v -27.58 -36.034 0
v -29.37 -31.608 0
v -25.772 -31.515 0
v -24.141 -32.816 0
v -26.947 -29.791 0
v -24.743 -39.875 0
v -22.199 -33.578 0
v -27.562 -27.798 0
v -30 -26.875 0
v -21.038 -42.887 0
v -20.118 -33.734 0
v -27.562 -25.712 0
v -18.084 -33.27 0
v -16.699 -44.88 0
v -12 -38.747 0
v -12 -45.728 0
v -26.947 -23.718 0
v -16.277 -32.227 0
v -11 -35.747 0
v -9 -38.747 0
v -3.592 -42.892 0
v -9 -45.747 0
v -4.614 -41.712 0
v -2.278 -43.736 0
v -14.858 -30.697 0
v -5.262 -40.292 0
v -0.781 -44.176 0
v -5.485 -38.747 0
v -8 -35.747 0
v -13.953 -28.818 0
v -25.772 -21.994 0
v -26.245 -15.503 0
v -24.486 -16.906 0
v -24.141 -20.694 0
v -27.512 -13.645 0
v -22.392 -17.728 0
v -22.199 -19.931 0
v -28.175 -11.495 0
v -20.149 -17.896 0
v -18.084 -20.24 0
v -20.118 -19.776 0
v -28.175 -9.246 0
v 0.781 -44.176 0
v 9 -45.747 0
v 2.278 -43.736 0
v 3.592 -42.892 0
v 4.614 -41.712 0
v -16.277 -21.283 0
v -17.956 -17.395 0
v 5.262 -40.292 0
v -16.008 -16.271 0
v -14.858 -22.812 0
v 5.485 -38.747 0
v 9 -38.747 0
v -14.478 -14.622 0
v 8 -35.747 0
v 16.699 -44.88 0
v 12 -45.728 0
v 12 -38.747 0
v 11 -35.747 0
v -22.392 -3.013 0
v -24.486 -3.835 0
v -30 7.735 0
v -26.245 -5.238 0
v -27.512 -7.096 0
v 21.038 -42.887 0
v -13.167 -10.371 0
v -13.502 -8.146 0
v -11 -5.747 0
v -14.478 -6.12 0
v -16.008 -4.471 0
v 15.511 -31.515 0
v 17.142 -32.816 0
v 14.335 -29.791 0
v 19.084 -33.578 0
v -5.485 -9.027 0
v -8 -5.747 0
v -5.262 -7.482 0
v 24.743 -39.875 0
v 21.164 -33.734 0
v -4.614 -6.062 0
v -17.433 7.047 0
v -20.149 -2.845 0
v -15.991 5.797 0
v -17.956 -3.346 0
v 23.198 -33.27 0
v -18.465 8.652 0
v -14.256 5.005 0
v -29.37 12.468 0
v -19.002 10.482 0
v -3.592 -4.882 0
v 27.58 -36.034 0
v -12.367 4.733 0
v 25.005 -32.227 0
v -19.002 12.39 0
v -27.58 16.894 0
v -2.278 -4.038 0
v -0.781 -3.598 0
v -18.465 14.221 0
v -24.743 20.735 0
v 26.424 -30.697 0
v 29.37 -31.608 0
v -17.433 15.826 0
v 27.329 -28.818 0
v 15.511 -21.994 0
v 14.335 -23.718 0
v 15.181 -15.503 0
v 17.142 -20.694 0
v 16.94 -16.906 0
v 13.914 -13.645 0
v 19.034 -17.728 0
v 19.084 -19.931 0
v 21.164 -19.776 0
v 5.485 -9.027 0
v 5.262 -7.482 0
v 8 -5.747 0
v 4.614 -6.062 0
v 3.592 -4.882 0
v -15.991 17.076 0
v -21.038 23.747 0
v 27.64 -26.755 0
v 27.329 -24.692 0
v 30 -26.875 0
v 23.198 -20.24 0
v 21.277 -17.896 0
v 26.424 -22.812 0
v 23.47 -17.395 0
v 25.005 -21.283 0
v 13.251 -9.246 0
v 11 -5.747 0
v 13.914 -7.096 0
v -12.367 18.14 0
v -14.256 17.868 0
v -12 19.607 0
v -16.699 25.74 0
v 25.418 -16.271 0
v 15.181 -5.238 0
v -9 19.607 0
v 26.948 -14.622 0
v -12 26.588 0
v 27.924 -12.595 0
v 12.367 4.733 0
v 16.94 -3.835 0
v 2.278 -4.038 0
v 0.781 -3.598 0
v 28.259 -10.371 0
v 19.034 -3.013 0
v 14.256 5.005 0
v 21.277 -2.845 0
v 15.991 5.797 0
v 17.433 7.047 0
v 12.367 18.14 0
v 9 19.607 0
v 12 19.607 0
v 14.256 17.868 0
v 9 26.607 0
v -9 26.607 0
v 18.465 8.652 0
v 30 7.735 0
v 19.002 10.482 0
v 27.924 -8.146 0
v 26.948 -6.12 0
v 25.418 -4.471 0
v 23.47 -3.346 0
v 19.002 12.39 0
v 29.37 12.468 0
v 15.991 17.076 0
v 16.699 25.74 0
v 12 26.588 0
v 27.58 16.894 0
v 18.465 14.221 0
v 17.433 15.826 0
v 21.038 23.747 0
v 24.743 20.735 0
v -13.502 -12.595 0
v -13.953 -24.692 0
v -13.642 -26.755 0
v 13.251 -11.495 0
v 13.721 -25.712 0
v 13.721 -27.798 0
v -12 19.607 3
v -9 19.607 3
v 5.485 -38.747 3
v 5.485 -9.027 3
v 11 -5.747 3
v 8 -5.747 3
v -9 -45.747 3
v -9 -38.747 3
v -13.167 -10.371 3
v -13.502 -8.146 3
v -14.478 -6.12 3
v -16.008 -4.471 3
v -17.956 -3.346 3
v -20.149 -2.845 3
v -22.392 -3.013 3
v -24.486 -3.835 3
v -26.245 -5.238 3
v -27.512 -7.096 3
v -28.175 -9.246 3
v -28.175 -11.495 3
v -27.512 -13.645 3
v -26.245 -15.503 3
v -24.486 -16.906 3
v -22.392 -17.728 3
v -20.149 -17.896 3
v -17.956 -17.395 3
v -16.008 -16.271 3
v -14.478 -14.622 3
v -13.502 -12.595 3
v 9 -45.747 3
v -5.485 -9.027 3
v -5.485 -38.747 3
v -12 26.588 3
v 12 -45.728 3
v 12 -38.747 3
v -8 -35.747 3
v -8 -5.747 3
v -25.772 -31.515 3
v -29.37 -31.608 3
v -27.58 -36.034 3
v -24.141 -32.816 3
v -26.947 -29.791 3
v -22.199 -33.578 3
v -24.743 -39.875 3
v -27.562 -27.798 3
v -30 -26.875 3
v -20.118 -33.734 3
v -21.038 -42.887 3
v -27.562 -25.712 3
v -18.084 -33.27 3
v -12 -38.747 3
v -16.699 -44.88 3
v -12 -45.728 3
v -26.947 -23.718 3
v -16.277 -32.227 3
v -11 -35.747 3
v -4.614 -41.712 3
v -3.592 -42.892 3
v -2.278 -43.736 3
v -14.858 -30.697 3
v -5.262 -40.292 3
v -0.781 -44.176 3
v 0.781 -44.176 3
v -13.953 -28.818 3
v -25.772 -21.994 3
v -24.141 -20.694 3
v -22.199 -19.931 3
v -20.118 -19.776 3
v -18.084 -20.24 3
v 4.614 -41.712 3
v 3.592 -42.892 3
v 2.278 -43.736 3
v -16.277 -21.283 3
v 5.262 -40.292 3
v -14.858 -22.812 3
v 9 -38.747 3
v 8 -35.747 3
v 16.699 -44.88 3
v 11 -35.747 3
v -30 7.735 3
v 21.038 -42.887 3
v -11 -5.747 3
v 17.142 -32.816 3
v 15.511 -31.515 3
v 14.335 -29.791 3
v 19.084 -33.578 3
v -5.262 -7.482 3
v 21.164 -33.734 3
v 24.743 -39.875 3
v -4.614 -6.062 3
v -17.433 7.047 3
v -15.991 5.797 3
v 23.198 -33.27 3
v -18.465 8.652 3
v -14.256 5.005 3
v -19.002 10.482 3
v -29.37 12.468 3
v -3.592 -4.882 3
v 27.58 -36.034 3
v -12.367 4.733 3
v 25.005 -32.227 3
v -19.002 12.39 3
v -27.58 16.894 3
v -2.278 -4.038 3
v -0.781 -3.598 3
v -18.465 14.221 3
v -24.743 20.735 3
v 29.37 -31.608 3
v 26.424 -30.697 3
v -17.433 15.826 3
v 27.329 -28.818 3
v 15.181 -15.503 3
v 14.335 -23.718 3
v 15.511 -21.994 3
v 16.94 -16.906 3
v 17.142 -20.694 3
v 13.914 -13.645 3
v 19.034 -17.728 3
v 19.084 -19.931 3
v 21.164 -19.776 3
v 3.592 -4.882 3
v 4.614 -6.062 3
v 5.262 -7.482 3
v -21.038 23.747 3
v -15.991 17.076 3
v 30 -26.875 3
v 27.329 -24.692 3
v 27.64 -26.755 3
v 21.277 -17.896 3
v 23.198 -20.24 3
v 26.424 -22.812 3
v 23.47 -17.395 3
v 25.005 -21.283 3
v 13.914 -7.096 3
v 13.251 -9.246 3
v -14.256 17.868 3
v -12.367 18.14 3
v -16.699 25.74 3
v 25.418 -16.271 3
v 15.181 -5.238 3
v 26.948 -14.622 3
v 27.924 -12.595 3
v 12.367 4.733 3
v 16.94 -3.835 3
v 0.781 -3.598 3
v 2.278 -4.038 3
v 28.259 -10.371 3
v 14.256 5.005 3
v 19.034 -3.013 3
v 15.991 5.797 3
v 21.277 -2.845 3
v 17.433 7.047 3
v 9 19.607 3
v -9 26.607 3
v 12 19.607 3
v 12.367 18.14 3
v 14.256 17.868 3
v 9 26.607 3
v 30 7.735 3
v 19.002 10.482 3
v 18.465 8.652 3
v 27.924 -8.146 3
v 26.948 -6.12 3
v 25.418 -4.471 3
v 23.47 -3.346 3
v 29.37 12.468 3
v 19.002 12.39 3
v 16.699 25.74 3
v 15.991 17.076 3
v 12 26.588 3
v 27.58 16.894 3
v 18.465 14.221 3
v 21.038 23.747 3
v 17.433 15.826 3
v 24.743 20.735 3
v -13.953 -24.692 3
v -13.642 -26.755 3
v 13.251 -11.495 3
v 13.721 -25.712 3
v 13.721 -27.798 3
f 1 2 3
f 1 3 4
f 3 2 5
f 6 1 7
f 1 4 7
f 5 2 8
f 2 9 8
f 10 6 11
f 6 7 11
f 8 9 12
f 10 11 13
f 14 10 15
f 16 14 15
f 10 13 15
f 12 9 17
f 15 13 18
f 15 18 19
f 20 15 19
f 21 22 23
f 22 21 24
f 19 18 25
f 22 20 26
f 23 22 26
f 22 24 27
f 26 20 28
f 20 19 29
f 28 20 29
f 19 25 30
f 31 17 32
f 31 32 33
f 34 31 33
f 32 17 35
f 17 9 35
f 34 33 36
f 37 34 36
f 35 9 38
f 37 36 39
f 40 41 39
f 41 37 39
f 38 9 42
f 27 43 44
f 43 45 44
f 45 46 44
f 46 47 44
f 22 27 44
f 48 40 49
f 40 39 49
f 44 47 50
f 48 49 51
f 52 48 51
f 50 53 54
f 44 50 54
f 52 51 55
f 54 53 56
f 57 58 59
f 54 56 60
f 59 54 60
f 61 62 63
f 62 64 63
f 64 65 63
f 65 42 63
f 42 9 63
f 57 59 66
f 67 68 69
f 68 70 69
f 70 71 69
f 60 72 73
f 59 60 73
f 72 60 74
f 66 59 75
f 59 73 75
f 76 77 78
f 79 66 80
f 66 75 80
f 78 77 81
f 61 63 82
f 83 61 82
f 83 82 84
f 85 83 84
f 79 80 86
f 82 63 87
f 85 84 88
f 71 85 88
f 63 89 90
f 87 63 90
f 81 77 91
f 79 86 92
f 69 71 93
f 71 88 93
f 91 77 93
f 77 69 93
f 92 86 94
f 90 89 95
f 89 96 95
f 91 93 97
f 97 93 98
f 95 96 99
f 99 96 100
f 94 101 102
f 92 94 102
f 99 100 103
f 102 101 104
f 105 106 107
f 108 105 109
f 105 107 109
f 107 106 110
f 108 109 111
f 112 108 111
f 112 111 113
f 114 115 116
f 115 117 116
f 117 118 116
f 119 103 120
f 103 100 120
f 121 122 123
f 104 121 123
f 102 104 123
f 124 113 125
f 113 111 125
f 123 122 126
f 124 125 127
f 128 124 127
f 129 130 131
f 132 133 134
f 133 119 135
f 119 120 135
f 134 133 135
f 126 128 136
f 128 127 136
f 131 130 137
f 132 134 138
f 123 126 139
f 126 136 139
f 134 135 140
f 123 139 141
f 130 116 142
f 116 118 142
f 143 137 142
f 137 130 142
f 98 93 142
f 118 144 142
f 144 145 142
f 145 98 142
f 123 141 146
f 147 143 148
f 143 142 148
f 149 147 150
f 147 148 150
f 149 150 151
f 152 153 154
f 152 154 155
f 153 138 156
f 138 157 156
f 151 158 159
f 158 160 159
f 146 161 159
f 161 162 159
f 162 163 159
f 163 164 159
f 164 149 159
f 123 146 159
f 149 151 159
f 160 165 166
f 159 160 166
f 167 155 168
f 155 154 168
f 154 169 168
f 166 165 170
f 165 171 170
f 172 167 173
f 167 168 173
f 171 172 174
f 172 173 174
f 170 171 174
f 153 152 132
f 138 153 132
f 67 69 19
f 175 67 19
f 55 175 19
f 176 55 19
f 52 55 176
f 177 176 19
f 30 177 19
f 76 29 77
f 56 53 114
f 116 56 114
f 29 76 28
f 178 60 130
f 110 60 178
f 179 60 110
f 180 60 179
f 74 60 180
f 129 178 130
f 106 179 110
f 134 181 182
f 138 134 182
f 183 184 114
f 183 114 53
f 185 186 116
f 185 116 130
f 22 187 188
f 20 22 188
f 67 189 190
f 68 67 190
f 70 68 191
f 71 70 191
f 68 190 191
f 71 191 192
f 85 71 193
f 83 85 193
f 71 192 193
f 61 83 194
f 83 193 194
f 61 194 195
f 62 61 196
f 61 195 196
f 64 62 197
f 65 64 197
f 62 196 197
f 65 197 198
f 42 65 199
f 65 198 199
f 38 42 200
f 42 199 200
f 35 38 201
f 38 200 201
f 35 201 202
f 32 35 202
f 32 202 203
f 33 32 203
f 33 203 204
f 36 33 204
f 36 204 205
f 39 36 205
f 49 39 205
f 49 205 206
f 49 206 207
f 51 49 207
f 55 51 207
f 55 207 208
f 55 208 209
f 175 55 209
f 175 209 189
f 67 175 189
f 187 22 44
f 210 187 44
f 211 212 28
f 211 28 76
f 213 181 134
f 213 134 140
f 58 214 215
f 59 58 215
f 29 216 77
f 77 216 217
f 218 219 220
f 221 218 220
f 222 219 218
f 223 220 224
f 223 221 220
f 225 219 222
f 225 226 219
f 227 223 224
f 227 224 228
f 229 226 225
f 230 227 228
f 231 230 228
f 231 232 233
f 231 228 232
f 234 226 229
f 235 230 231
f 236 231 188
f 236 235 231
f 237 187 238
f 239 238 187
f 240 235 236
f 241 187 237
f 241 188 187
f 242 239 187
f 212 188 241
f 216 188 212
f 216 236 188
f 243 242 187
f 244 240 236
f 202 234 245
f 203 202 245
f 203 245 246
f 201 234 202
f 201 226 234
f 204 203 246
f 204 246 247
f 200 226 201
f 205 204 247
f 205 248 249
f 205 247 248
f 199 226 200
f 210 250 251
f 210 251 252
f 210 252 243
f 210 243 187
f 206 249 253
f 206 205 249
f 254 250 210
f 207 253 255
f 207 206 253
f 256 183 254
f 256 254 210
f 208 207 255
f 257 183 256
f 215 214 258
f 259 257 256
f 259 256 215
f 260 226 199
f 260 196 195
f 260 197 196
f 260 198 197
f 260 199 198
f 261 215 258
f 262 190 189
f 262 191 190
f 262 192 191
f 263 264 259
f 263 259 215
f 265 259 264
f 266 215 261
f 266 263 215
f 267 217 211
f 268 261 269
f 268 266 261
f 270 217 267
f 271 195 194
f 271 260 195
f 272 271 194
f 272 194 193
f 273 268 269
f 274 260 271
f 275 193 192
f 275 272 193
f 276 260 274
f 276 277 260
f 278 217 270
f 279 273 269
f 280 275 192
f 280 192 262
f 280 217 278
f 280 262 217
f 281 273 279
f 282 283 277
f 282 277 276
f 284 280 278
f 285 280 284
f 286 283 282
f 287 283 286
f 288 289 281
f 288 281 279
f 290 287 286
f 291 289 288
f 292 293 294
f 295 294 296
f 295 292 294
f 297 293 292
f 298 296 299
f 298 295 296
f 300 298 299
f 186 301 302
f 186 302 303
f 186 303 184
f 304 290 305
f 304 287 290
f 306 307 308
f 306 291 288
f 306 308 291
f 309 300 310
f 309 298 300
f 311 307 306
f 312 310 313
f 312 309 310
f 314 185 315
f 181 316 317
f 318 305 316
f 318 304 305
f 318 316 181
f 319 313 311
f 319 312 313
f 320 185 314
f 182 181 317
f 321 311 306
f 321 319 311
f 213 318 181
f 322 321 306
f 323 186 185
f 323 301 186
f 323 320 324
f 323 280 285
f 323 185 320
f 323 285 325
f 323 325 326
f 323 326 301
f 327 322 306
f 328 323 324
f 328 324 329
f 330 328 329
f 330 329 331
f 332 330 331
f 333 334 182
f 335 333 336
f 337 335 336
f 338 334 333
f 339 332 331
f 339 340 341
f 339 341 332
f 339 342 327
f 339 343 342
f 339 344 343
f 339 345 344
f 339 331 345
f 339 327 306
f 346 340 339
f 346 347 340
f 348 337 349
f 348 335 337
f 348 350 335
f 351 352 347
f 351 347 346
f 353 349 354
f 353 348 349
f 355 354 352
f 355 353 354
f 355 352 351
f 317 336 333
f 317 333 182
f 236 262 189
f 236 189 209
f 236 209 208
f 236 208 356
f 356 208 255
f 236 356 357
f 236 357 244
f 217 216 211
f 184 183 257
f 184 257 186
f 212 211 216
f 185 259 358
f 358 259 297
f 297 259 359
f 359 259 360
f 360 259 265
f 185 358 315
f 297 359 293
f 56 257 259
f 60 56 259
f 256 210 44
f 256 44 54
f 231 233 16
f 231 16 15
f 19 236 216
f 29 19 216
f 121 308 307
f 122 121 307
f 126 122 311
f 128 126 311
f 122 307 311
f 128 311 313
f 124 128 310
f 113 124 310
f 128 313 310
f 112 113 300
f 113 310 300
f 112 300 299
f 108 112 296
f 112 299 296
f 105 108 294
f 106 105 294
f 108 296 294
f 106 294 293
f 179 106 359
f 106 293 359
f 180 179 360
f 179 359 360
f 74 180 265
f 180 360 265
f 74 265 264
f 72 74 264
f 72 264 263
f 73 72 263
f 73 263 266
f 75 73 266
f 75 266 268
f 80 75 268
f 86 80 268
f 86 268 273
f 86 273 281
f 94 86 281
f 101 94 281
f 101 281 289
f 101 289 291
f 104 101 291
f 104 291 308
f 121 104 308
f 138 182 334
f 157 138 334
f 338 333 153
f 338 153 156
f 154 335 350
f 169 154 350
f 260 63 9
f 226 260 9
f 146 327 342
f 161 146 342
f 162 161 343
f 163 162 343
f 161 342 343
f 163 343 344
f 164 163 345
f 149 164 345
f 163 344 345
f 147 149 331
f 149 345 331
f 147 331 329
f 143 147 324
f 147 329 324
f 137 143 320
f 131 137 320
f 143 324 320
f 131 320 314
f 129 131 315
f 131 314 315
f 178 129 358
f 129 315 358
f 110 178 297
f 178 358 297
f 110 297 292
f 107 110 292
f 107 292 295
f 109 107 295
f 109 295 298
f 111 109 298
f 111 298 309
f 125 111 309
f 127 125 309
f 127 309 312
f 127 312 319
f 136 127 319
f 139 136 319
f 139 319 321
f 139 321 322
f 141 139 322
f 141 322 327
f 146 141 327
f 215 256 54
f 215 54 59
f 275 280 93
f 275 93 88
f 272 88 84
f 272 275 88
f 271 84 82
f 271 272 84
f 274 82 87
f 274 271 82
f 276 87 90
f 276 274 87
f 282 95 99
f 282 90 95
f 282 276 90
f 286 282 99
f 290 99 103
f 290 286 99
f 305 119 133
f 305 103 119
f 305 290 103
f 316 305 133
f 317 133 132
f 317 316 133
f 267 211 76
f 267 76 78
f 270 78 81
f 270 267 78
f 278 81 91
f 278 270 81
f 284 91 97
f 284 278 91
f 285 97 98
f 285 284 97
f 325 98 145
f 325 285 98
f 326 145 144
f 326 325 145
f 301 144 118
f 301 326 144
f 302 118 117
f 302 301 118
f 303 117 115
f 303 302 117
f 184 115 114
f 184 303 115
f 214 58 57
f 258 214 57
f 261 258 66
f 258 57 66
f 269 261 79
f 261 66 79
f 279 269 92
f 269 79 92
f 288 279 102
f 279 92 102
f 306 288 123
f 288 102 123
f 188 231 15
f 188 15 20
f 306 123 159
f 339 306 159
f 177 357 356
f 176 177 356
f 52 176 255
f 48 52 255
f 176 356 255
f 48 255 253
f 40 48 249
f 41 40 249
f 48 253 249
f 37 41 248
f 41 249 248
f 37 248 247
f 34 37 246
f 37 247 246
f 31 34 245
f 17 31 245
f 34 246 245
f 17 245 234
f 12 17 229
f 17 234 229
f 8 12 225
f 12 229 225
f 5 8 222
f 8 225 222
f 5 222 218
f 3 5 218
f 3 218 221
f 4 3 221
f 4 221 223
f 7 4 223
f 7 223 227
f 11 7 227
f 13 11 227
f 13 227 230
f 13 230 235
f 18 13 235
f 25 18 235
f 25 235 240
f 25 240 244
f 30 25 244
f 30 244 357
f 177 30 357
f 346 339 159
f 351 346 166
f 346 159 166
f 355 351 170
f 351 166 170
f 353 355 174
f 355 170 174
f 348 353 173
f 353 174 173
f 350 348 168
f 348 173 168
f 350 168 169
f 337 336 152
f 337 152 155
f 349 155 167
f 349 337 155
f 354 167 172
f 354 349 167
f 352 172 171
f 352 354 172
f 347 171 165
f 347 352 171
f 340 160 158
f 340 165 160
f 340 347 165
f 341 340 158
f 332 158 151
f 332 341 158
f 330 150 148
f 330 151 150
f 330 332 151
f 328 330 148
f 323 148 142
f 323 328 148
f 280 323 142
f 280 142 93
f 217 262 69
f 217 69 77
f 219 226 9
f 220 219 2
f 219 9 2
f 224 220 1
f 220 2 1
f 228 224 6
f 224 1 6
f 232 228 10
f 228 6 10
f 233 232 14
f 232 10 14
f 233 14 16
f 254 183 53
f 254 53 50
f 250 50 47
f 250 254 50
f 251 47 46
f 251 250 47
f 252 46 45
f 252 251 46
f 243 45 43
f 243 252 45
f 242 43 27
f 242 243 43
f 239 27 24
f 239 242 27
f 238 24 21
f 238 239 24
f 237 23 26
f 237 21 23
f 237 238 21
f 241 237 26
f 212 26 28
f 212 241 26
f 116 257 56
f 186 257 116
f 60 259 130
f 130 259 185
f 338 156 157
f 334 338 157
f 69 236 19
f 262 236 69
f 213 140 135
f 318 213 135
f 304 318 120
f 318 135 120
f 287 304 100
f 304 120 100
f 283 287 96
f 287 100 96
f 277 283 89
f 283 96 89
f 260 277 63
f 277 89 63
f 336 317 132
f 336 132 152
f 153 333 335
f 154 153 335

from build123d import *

# Parameters (mm, degrees)
BOSS_EXTRUDE1_DEPTH     = 3
SKETCH2_R               = 7.546344396
SKETCH2_R_2             = 6.998827146
SKETCH2_W               = 3
SKETCH2_H               = 30
SKETCH2_H_2             = 7
CUT_EXTRUDE1_DEPTH      = 1
CUT_EXTRUDE1_DEPTH_BACK = 4


with BuildPart() as part:
    # Sketch1 → Boss-Extrude1 (new body)
    with BuildSketch(Plane.XY):
        with BuildLine():
            Line((-11.521707287, -45.747254375), (11.521707287, -45.747254375))
            ThreePointArc((11.521707287, -45.747254375), (24.576520143, -40.046827338), (30, -26.874550642))
            Line((30, -26.874550642), (30, 7.734550642))
            ThreePointArc((30, 7.734550642), (24.576520143, 20.906827338), (11.521707287, 26.607254375))
            Line((11.521707287, 26.607254375), (-11.521707287, 26.607254375))
            ThreePointArc((-11.521707287, 26.607254375), (-24.576520143, 20.906827338), (-30, 7.734550642))
            Line((-30, 7.734550642), (-30, -26.874550642))
            ThreePointArc((-30, -26.874550642), (-24.576520143, -40.046827338), (-11.521707287, -45.747254375))
        make_face()
    extrude(amount=BOSS_EXTRUDE1_DEPTH)

    # Sketch2 → Cut-Extrude1 (cut, two sides)
    with BuildSketch(Plane.XY.offset(3)) as cut_extrude1_sk:
        with Locations((-20.712852781, -10.370577489)):
            Circle(SKETCH2_R)
        with Locations((-20.641158555, -26.754776444)):
            Circle(SKETCH2_R_2)
        with Locations((20.641158555, -26.754776444)):
            Circle(SKETCH2_R_2)
        with Locations((20.712852781, -10.370577489)):
            Circle(SKETCH2_R)
        with Locations((-9.5, -20.747254375)):
            Rectangle(SKETCH2_W, SKETCH2_H)
        with Locations((9.5, -20.747254375)):
            Rectangle(SKETCH2_W, SKETCH2_H)
        with BuildLine():
            Line((-12.367254006, 18.139818395), (12.367254006, 18.139818395))
            ThreePointArc((12.367254006, 18.139818395), (19.070664148, 11.436408253), (12.367254006, 4.732998111))
            Line((12.367254006, 4.732998111), (-12.367254006, 4.732998111))
            ThreePointArc((-12.367254006, 4.732998111), (-19.070664148, 11.436408253), (-12.367254006, 18.139818395))
        make_face()
        with BuildLine():
            Line((5.484608298, -9.027083299), (5.484608298, -38.747254375))
            ThreePointArc((5.484608298, -38.747254375), (0, -44.231862673), (-5.484608298, -38.747254375))
            Line((-5.484608298, -38.747254375), (-5.484608298, -9.027083299))
            ThreePointArc((-5.484608298, -9.027083299), (0, -3.542475001), (5.484608298, -9.027083299))
        make_face()
        with Locations((10.5, -42.247254375)):
            Rectangle(SKETCH2_W, SKETCH2_H_2)
        with Locations((-10.5, -42.247254375)):
            Rectangle(SKETCH2_W, SKETCH2_H_2)
        with Locations((-10.5, 23.107254375)):
            Rectangle(SKETCH2_W, SKETCH2_H_2)
        with Locations((10.5, 23.107254375)):
            Rectangle(SKETCH2_W, SKETCH2_H_2)
    extrude(amount=CUT_EXTRUDE1_DEPTH, mode=Mode.SUBTRACT)
    extrude(cut_extrude1_sk.sketch, amount=-CUT_EXTRUDE1_DEPTH_BACK, mode=Mode.SUBTRACT)


solid = part.part
